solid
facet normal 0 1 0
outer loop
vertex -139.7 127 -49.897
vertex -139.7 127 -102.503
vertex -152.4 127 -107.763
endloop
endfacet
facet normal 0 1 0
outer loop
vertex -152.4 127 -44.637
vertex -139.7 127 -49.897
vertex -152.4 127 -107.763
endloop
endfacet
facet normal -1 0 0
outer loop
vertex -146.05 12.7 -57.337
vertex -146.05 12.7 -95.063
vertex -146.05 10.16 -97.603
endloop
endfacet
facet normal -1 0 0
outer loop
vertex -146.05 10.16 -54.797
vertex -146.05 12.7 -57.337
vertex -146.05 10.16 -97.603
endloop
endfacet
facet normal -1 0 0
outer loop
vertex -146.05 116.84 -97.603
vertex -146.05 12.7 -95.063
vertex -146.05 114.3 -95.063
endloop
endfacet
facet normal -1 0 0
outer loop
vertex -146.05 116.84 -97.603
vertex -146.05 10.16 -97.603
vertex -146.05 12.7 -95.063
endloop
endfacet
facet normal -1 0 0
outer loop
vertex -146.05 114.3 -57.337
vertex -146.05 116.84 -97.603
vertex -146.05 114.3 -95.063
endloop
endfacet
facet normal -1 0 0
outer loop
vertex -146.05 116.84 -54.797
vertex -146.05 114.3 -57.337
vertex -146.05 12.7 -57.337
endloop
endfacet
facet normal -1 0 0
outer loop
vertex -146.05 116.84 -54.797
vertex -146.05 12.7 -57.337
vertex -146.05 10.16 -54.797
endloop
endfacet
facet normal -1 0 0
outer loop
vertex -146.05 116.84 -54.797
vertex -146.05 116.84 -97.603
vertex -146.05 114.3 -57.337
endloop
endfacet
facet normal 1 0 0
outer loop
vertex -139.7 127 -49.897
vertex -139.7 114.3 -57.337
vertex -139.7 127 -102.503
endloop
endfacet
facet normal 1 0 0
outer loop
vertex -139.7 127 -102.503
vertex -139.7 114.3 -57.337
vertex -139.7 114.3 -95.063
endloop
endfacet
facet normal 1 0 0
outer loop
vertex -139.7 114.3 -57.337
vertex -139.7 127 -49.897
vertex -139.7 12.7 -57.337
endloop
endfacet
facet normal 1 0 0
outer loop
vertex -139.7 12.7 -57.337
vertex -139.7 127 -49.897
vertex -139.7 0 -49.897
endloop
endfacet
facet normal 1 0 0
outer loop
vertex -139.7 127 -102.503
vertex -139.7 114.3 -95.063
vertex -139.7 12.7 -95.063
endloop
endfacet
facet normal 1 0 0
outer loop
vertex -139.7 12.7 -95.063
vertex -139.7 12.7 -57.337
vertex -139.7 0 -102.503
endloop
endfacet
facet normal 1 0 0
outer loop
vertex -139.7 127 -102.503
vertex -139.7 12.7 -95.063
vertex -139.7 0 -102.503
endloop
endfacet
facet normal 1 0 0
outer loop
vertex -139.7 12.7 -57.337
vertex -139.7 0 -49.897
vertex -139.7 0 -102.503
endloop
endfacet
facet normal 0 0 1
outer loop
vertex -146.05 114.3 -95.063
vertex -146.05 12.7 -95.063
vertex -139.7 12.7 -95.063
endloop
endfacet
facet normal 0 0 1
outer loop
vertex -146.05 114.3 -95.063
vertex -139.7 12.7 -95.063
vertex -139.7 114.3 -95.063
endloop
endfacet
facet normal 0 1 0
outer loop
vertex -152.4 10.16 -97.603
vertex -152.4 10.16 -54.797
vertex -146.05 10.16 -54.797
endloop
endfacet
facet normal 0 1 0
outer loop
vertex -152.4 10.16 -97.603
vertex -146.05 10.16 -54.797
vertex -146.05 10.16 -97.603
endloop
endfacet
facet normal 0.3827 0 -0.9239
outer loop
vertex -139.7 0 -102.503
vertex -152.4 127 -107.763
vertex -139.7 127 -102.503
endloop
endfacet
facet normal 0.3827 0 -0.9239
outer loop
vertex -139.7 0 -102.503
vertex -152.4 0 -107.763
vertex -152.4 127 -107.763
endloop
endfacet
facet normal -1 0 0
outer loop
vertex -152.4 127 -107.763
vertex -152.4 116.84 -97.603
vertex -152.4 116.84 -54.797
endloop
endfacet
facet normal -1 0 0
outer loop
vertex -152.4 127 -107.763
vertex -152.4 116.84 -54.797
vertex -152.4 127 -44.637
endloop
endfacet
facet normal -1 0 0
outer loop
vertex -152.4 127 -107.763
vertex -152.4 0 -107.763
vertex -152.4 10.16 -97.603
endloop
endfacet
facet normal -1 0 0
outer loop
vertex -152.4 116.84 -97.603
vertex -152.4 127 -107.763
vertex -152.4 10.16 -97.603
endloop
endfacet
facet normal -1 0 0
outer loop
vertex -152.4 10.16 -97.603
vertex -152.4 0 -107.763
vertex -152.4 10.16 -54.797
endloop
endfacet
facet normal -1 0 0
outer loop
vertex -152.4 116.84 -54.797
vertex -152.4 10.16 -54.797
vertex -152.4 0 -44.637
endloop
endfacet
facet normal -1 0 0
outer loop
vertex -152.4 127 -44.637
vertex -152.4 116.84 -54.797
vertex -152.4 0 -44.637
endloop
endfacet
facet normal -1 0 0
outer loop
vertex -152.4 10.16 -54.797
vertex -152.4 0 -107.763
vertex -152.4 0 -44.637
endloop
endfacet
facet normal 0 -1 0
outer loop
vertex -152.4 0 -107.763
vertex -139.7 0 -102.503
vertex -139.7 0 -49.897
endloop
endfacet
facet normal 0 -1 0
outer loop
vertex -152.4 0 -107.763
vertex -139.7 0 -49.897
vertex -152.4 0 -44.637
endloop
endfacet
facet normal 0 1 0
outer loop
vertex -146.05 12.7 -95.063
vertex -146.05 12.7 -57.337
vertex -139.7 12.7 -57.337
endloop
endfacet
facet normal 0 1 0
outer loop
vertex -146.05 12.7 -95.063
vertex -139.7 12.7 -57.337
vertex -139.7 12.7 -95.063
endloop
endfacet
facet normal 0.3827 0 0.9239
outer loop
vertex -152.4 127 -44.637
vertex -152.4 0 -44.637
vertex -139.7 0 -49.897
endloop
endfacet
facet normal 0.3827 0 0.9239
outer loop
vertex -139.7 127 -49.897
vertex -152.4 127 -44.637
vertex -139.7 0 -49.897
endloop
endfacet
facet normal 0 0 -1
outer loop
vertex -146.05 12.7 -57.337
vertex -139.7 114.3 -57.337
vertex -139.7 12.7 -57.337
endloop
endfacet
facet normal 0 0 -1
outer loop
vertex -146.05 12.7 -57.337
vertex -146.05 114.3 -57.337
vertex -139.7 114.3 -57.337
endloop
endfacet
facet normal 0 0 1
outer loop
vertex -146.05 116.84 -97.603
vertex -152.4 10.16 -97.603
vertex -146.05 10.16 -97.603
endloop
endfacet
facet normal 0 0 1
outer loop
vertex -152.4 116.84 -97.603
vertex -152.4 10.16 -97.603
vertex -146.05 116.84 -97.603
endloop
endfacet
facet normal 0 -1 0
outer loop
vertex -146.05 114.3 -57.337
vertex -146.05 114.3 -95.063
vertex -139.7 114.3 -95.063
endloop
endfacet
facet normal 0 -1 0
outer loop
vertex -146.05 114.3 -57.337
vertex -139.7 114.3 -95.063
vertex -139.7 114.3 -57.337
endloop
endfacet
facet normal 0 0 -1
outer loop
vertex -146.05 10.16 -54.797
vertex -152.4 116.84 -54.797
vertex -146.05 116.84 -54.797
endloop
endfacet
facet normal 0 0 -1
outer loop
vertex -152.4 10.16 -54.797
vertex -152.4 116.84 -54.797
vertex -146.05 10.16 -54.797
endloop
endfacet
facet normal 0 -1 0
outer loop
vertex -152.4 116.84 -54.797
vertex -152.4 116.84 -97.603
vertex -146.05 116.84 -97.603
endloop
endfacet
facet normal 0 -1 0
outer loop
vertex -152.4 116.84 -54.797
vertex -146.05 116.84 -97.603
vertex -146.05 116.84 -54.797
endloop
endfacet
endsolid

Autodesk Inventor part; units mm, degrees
ref_plane "YZ Plane" through (0, 0, 0) normal (1, 0, 0) x (0, 1, 0)
ref_plane "XZ Plane" through (0, 0, 0) normal (0, 1, 0) x (-1, 0, 0)
ref_plane "XY Plane" through (0, 0, 0) normal (0, 0, 1) x (1, 0, 0)
sketch "Sketch1" plane through (0, 0, 0) normal (0, 1, 0) x (-1, 0, 0)
  line L0 (0, 0) -> (152.4, 0) construction
  line L1 (152.4, 0) -> (152.4, -152.4) construction
  line L2 (152.4, -152.4) -> (0, -152.4) construction
  line L3 (0, -152.4) -> (0, 0) construction
  line L4 (44.6369, -152.4) -> (0, -107.7631) construction
  line L5 (0, -107.7631) -> (0, -44.6369) construction
  line L6 (0, -44.6369) -> (44.6369, 0) construction
  line L7 (44.6369, 0) -> (107.7631, 0) construction
  line L8 (107.7631, 0) -> (152.4, -44.6369) construction
  line L9 (152.4, -44.6369) -> (152.4, -107.7631) construction
  line L10 (152.4, -107.7631) -> (107.7631, -152.4) construction
  line L11 (107.7631, -152.4) -> (44.6369, -152.4) construction
  line L12 (102.5026, -12.7) -> (139.7, -49.8974) construction
  line L13 (139.7, -49.8974) -> (139.7, -102.5026) construction
  line L14 (139.7, -102.5026) -> (102.5026, -139.7) construction
  line L15 (102.5026, -139.7) -> (49.8974, -139.7) construction
  line L16 (49.8974, -139.7) -> (12.7, -102.5026) construction
  line L17 (12.7, -102.5026) -> (12.7, -49.8974) construction
  line L18 (12.7, -49.8974) -> (49.8974, -12.7) construction
  line L19 (49.8974, -12.7) -> (102.5026, -12.7) construction
  line L20 (152.4, -44.6369) -> (139.7, -49.8974)
  line L21 (139.7, -49.8974) -> (139.7, -102.5026)
  line L22 (152.4, -107.7631) -> (139.7, -102.5026)
  line L23 (152.4, -107.7631) -> (152.4, -44.6369)
  point P0 (76.2, -76.2)
  point P1 (76.2, -76.2)
  point P2 (76.2, -76.2)
  dimension "d0" = 152.4
  dimension "d1" = 152.4
  dimension "d2" = 12.7
  dimension "d3" = 63.1262
  dimension "d4" = 52.6051
extrude "Extrusion1" add sketch "Sketch1" along normal blind 127
sketch "Sketch2" plane through (-152.4, 0, -107.7631) normal (-1, 0, 0) x (0, 0, 1)
  line L0 (63.1261, 0) -> (63.1261, 127) projected
  line L1 (0, 127) -> (63.1261, 127) projected
  line L2 (0, 0) -> (0, 127) projected
  line L3 (0, 0) -> (63.1261, 0) projected
  line L4 (12.7, 114.3) -> (50.4261, 114.3)
  line L5 (50.4261, 114.3) -> (50.4261, 12.7)
  line L6 (50.4261, 12.7) -> (12.7, 12.7)
  line L7 (12.7, 12.7) -> (12.7, 114.3)
  point P0 (107.7631, 0)
  point P1 (12.7, 12.7)
  dimension "d7" = 12.7
  dimension "d8" = 12.7
  dimension "d9" = 12.7
  dimension "d10" = 12.7
  dimension "d11" = 12.7
  dimension "d12" = 12.7
  dimension "d13" = 12.7
  dimension "d14" = 12.7
extrude "Extrusion2" cut sketch "Sketch2" against normal up to surface (12.7 mm away) contours L4 L5 L6 L7
sketch "Sketch4" plane through (-152.4, 0, -107.7631) normal (-1, 0, 0) x (0, 0, 1)
  line L0 (0, 127) -> (63.1261, 127) projected
  line L1 (0, 0) -> (0, 127) projected
  line L2 (0, 0) -> (63.1261, 0) projected
  line L3 (63.1261, 0) -> (63.1261, 127) projected
  line L4 (10.16, 116.84) -> (52.9661, 116.84)
  line L5 (52.9661, 116.84) -> (52.9661, 10.16)
  line L6 (52.9661, 10.16) -> (10.16, 10.16)
  line L7 (10.16, 10.16) -> (10.16, 116.84)
  line L8 (50.4261, 114.3) -> (12.7, 114.3) projected
  line L9 (50.4261, 114.3) -> (50.4261, 12.7) projected
  line L10 (12.7, 114.3) -> (50.4261, 114.3)
  line L11 (50.4261, 114.3) -> (50.4261, 12.7)
  line L12 (50.4261, 12.7) -> (12.7, 12.7)
  line L13 (12.7, 12.7) -> (12.7, 114.3)
  point P0 (107.7631, 0)
  dimension "d17" = 10.16
  dimension "d18" = 10.16
  dimension "d19" = 10.16
  dimension "d20" = 10.16
extrude "Extrusion3" cut sketch "Sketch4" against normal blind 6.35 contours L4 L5 L6 L7
equation "\"d9\" = d8"
equation "\"d10\" = d8"
equation "\"d11\" = d9"
equation "\"d12\" = d9"
equation "\"d13\" = d9"
equation "\"d14\" = d9"
properties part number "SatelliteSideWallSensor"
